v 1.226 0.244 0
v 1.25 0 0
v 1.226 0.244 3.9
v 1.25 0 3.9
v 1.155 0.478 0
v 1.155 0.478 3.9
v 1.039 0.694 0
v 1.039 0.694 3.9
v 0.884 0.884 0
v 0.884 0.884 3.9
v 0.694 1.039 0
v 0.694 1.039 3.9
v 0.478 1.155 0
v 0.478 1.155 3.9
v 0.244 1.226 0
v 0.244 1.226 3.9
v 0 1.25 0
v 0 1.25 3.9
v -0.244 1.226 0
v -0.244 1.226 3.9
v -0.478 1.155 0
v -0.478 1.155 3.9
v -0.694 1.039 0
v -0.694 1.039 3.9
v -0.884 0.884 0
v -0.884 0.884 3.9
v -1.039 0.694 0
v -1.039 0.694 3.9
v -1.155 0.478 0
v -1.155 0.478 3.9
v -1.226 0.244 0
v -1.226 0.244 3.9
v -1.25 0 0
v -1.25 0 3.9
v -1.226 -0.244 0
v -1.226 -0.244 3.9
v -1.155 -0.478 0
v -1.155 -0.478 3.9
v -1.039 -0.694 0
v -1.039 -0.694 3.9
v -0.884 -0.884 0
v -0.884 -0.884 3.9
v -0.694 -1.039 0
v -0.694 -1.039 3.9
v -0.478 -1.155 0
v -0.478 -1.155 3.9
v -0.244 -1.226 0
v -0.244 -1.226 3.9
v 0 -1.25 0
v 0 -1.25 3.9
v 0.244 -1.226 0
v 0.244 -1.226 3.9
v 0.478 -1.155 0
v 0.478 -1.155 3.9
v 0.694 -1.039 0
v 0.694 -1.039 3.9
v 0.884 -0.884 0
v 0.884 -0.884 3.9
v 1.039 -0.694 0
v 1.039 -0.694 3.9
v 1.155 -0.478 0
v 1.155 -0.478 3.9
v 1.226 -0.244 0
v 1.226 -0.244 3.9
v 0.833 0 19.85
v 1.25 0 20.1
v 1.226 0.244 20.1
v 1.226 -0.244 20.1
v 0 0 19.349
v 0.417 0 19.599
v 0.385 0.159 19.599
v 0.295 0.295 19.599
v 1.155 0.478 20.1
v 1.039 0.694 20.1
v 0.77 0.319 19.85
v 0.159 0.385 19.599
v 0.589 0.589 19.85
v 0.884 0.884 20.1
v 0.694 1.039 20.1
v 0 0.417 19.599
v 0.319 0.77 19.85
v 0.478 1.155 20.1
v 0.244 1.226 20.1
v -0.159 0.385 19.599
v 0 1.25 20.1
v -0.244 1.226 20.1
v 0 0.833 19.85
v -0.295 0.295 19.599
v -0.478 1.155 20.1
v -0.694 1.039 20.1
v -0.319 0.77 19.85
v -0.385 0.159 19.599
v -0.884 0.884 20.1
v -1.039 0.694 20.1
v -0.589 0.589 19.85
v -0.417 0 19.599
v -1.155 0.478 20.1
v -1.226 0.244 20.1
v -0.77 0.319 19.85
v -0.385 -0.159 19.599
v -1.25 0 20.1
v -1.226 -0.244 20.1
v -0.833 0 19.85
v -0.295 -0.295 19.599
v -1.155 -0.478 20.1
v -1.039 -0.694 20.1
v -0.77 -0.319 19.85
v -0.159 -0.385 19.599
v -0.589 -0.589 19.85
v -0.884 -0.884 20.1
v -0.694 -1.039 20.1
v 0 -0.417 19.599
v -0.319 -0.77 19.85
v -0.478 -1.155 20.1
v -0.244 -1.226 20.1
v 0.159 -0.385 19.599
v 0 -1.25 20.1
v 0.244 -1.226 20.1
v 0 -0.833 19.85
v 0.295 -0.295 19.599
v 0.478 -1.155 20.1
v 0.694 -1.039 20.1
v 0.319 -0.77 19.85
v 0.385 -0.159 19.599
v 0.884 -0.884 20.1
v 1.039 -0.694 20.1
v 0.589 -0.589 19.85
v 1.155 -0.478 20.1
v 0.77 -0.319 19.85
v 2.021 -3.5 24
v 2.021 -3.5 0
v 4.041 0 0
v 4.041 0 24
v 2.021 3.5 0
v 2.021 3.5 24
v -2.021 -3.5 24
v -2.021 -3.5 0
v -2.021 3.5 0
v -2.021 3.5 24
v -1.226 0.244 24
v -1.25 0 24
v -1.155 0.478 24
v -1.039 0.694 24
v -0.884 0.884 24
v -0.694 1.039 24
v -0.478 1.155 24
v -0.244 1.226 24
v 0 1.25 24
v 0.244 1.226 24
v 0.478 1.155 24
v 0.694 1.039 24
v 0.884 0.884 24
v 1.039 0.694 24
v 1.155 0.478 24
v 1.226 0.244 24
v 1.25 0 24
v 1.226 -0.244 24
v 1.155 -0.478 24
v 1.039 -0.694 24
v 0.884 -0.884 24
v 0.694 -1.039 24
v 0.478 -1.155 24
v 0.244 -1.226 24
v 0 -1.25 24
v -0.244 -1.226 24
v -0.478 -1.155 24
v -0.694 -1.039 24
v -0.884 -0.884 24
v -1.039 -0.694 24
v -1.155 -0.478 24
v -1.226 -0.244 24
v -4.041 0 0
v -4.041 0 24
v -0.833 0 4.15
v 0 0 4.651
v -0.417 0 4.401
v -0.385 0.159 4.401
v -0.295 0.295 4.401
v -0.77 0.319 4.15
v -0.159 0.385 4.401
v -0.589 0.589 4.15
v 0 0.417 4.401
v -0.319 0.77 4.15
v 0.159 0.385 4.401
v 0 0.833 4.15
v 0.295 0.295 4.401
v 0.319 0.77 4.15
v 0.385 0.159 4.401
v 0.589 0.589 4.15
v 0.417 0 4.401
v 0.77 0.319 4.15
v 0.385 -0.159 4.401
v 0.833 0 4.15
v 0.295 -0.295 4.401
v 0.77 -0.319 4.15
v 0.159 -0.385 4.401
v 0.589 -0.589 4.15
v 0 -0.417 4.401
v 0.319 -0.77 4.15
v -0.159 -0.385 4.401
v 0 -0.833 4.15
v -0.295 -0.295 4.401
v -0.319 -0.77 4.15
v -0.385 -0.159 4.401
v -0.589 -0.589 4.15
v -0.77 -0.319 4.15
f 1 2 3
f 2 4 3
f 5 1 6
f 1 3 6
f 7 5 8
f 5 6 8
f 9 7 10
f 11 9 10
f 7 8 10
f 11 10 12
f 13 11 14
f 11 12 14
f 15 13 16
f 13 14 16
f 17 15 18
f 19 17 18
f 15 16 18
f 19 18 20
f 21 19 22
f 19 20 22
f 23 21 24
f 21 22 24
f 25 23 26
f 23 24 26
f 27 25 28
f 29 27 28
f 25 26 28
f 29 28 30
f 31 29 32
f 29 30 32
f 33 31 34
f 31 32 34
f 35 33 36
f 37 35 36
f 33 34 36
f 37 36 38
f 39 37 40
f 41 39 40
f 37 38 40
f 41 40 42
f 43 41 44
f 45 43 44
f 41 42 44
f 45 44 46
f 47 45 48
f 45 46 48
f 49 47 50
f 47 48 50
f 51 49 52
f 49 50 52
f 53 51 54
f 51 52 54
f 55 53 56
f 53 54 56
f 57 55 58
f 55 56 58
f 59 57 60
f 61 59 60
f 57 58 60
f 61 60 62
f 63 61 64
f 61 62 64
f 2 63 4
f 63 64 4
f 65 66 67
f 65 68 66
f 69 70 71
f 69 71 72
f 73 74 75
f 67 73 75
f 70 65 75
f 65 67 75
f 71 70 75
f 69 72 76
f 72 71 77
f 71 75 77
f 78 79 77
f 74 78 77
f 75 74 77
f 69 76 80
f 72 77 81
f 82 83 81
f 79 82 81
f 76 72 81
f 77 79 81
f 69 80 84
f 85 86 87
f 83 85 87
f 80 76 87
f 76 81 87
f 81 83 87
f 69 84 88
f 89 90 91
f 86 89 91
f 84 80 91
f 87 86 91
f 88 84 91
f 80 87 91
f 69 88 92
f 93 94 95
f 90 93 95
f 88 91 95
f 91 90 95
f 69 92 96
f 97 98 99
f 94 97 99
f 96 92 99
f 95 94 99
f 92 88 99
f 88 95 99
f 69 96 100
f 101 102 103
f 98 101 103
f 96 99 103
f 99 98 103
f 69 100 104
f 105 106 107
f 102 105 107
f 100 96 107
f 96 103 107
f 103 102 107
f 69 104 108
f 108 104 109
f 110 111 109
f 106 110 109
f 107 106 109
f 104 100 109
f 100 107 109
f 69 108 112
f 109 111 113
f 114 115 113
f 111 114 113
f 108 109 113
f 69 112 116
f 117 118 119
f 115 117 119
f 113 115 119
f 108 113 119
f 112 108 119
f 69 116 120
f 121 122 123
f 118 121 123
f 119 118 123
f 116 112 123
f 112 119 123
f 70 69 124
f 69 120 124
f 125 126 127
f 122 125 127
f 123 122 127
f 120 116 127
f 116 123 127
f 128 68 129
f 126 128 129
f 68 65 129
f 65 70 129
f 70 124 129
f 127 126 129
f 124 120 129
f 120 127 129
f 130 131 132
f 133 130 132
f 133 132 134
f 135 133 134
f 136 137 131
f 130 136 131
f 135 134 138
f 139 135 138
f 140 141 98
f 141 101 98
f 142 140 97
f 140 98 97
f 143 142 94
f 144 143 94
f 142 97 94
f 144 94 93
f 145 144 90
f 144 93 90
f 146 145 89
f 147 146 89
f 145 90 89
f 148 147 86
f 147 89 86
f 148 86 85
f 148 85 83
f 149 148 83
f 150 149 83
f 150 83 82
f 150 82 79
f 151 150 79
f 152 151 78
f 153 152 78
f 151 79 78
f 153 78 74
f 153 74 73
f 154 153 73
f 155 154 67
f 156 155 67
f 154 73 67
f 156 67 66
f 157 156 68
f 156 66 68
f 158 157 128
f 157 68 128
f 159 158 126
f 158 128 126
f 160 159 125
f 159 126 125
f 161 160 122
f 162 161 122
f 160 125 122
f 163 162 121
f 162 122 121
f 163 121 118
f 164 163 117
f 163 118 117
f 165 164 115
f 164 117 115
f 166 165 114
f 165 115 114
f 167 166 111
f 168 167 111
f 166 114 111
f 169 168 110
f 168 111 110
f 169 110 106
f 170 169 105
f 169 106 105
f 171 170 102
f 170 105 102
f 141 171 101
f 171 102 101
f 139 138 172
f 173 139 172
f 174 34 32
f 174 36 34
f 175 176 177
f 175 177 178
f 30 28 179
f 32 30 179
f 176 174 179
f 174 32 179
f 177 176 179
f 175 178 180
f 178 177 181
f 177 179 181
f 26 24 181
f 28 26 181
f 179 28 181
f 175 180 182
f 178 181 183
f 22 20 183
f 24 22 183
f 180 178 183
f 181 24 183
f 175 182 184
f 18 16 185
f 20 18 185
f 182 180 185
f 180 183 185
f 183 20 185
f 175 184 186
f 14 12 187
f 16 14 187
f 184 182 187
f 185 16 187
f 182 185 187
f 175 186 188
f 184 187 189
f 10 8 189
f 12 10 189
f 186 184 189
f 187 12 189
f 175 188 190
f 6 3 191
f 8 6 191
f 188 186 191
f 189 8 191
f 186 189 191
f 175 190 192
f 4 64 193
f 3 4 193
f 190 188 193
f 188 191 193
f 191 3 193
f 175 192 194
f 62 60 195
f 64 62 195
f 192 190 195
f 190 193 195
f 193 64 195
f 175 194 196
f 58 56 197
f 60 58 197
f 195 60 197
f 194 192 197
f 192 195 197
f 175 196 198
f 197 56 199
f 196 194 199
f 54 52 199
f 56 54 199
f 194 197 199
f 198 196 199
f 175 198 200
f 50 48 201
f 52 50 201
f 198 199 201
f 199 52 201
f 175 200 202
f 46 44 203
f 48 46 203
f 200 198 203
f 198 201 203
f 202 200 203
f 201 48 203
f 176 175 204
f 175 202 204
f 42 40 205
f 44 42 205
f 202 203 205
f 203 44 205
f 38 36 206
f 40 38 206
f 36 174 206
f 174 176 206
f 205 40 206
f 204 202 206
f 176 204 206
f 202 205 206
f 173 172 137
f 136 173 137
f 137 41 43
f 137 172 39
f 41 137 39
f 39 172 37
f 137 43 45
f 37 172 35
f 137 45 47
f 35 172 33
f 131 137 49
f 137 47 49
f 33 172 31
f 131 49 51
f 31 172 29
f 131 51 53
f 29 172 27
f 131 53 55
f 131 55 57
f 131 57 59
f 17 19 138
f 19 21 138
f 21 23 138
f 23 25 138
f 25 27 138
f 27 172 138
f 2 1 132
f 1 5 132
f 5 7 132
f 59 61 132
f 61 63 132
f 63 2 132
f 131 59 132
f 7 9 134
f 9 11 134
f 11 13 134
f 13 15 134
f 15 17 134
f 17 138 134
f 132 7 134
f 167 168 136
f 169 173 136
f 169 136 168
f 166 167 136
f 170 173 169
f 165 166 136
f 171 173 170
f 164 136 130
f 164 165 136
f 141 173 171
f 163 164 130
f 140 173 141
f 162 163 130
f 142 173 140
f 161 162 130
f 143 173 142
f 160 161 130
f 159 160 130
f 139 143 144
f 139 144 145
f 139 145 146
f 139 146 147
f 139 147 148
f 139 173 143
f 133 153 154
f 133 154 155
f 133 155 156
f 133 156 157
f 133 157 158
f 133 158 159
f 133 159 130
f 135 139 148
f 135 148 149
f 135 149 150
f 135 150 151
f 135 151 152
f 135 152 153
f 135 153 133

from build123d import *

# Parameters (mm, degrees)
EXTRUDE_1_DEPTH        = 24
HOLE_WIZARD_M3_1_D     = 2.5
HOLE_WIZARD_M3_1_DEPTH = 3.9
HOLE_WIZARD_M3_1_TIP   = 0.751075774
HOLE_WIZARD_M3_2_D     = 2.5
HOLE_WIZARD_M3_2_DEPTH = 3.9
HOLE_WIZARD_M3_2_TIP   = 0.751075774


with BuildPart() as part:
    # 草图1 → 凸台-拉伸1 (new body)
    with BuildSketch(Plane.XY):
        Polygon((4.041451884, 0), (2.020725942, 3.5), (-2.020725942, 3.5), (-4.041451884, 0), (-2.020725942, -3.5), (2.020725942, -3.5), align=None)
    extrude(amount=EXTRUDE_1_DEPTH)

    # M3 螺纹孔1
    with Locations(Plane(origin=(0, 0, 0), x_dir=(-1, 0, 0), z_dir=(0, 0, -1))):
        with Locations((0, 0)):
            Hole(HOLE_WIZARD_M3_1_D / 2, depth=HOLE_WIZARD_M3_1_DEPTH)
            with Locations((0, 0, -(HOLE_WIZARD_M3_1_DEPTH + HOLE_WIZARD_M3_1_TIP / 2))):  # 118° drill point
                Cone(0, HOLE_WIZARD_M3_1_D / 2, HOLE_WIZARD_M3_1_TIP, mode=Mode.SUBTRACT)

    # M3 螺纹孔2
    with Locations(Plane.XY.offset(24)):
        with Locations((0, 0)):
            Hole(HOLE_WIZARD_M3_2_D / 2, depth=HOLE_WIZARD_M3_2_DEPTH)
            with Locations((0, 0, -(HOLE_WIZARD_M3_2_DEPTH + HOLE_WIZARD_M3_2_TIP / 2))):  # 118° drill point
                Cone(0, HOLE_WIZARD_M3_2_D / 2, HOLE_WIZARD_M3_2_TIP, mode=Mode.SUBTRACT)


solid = part.part
